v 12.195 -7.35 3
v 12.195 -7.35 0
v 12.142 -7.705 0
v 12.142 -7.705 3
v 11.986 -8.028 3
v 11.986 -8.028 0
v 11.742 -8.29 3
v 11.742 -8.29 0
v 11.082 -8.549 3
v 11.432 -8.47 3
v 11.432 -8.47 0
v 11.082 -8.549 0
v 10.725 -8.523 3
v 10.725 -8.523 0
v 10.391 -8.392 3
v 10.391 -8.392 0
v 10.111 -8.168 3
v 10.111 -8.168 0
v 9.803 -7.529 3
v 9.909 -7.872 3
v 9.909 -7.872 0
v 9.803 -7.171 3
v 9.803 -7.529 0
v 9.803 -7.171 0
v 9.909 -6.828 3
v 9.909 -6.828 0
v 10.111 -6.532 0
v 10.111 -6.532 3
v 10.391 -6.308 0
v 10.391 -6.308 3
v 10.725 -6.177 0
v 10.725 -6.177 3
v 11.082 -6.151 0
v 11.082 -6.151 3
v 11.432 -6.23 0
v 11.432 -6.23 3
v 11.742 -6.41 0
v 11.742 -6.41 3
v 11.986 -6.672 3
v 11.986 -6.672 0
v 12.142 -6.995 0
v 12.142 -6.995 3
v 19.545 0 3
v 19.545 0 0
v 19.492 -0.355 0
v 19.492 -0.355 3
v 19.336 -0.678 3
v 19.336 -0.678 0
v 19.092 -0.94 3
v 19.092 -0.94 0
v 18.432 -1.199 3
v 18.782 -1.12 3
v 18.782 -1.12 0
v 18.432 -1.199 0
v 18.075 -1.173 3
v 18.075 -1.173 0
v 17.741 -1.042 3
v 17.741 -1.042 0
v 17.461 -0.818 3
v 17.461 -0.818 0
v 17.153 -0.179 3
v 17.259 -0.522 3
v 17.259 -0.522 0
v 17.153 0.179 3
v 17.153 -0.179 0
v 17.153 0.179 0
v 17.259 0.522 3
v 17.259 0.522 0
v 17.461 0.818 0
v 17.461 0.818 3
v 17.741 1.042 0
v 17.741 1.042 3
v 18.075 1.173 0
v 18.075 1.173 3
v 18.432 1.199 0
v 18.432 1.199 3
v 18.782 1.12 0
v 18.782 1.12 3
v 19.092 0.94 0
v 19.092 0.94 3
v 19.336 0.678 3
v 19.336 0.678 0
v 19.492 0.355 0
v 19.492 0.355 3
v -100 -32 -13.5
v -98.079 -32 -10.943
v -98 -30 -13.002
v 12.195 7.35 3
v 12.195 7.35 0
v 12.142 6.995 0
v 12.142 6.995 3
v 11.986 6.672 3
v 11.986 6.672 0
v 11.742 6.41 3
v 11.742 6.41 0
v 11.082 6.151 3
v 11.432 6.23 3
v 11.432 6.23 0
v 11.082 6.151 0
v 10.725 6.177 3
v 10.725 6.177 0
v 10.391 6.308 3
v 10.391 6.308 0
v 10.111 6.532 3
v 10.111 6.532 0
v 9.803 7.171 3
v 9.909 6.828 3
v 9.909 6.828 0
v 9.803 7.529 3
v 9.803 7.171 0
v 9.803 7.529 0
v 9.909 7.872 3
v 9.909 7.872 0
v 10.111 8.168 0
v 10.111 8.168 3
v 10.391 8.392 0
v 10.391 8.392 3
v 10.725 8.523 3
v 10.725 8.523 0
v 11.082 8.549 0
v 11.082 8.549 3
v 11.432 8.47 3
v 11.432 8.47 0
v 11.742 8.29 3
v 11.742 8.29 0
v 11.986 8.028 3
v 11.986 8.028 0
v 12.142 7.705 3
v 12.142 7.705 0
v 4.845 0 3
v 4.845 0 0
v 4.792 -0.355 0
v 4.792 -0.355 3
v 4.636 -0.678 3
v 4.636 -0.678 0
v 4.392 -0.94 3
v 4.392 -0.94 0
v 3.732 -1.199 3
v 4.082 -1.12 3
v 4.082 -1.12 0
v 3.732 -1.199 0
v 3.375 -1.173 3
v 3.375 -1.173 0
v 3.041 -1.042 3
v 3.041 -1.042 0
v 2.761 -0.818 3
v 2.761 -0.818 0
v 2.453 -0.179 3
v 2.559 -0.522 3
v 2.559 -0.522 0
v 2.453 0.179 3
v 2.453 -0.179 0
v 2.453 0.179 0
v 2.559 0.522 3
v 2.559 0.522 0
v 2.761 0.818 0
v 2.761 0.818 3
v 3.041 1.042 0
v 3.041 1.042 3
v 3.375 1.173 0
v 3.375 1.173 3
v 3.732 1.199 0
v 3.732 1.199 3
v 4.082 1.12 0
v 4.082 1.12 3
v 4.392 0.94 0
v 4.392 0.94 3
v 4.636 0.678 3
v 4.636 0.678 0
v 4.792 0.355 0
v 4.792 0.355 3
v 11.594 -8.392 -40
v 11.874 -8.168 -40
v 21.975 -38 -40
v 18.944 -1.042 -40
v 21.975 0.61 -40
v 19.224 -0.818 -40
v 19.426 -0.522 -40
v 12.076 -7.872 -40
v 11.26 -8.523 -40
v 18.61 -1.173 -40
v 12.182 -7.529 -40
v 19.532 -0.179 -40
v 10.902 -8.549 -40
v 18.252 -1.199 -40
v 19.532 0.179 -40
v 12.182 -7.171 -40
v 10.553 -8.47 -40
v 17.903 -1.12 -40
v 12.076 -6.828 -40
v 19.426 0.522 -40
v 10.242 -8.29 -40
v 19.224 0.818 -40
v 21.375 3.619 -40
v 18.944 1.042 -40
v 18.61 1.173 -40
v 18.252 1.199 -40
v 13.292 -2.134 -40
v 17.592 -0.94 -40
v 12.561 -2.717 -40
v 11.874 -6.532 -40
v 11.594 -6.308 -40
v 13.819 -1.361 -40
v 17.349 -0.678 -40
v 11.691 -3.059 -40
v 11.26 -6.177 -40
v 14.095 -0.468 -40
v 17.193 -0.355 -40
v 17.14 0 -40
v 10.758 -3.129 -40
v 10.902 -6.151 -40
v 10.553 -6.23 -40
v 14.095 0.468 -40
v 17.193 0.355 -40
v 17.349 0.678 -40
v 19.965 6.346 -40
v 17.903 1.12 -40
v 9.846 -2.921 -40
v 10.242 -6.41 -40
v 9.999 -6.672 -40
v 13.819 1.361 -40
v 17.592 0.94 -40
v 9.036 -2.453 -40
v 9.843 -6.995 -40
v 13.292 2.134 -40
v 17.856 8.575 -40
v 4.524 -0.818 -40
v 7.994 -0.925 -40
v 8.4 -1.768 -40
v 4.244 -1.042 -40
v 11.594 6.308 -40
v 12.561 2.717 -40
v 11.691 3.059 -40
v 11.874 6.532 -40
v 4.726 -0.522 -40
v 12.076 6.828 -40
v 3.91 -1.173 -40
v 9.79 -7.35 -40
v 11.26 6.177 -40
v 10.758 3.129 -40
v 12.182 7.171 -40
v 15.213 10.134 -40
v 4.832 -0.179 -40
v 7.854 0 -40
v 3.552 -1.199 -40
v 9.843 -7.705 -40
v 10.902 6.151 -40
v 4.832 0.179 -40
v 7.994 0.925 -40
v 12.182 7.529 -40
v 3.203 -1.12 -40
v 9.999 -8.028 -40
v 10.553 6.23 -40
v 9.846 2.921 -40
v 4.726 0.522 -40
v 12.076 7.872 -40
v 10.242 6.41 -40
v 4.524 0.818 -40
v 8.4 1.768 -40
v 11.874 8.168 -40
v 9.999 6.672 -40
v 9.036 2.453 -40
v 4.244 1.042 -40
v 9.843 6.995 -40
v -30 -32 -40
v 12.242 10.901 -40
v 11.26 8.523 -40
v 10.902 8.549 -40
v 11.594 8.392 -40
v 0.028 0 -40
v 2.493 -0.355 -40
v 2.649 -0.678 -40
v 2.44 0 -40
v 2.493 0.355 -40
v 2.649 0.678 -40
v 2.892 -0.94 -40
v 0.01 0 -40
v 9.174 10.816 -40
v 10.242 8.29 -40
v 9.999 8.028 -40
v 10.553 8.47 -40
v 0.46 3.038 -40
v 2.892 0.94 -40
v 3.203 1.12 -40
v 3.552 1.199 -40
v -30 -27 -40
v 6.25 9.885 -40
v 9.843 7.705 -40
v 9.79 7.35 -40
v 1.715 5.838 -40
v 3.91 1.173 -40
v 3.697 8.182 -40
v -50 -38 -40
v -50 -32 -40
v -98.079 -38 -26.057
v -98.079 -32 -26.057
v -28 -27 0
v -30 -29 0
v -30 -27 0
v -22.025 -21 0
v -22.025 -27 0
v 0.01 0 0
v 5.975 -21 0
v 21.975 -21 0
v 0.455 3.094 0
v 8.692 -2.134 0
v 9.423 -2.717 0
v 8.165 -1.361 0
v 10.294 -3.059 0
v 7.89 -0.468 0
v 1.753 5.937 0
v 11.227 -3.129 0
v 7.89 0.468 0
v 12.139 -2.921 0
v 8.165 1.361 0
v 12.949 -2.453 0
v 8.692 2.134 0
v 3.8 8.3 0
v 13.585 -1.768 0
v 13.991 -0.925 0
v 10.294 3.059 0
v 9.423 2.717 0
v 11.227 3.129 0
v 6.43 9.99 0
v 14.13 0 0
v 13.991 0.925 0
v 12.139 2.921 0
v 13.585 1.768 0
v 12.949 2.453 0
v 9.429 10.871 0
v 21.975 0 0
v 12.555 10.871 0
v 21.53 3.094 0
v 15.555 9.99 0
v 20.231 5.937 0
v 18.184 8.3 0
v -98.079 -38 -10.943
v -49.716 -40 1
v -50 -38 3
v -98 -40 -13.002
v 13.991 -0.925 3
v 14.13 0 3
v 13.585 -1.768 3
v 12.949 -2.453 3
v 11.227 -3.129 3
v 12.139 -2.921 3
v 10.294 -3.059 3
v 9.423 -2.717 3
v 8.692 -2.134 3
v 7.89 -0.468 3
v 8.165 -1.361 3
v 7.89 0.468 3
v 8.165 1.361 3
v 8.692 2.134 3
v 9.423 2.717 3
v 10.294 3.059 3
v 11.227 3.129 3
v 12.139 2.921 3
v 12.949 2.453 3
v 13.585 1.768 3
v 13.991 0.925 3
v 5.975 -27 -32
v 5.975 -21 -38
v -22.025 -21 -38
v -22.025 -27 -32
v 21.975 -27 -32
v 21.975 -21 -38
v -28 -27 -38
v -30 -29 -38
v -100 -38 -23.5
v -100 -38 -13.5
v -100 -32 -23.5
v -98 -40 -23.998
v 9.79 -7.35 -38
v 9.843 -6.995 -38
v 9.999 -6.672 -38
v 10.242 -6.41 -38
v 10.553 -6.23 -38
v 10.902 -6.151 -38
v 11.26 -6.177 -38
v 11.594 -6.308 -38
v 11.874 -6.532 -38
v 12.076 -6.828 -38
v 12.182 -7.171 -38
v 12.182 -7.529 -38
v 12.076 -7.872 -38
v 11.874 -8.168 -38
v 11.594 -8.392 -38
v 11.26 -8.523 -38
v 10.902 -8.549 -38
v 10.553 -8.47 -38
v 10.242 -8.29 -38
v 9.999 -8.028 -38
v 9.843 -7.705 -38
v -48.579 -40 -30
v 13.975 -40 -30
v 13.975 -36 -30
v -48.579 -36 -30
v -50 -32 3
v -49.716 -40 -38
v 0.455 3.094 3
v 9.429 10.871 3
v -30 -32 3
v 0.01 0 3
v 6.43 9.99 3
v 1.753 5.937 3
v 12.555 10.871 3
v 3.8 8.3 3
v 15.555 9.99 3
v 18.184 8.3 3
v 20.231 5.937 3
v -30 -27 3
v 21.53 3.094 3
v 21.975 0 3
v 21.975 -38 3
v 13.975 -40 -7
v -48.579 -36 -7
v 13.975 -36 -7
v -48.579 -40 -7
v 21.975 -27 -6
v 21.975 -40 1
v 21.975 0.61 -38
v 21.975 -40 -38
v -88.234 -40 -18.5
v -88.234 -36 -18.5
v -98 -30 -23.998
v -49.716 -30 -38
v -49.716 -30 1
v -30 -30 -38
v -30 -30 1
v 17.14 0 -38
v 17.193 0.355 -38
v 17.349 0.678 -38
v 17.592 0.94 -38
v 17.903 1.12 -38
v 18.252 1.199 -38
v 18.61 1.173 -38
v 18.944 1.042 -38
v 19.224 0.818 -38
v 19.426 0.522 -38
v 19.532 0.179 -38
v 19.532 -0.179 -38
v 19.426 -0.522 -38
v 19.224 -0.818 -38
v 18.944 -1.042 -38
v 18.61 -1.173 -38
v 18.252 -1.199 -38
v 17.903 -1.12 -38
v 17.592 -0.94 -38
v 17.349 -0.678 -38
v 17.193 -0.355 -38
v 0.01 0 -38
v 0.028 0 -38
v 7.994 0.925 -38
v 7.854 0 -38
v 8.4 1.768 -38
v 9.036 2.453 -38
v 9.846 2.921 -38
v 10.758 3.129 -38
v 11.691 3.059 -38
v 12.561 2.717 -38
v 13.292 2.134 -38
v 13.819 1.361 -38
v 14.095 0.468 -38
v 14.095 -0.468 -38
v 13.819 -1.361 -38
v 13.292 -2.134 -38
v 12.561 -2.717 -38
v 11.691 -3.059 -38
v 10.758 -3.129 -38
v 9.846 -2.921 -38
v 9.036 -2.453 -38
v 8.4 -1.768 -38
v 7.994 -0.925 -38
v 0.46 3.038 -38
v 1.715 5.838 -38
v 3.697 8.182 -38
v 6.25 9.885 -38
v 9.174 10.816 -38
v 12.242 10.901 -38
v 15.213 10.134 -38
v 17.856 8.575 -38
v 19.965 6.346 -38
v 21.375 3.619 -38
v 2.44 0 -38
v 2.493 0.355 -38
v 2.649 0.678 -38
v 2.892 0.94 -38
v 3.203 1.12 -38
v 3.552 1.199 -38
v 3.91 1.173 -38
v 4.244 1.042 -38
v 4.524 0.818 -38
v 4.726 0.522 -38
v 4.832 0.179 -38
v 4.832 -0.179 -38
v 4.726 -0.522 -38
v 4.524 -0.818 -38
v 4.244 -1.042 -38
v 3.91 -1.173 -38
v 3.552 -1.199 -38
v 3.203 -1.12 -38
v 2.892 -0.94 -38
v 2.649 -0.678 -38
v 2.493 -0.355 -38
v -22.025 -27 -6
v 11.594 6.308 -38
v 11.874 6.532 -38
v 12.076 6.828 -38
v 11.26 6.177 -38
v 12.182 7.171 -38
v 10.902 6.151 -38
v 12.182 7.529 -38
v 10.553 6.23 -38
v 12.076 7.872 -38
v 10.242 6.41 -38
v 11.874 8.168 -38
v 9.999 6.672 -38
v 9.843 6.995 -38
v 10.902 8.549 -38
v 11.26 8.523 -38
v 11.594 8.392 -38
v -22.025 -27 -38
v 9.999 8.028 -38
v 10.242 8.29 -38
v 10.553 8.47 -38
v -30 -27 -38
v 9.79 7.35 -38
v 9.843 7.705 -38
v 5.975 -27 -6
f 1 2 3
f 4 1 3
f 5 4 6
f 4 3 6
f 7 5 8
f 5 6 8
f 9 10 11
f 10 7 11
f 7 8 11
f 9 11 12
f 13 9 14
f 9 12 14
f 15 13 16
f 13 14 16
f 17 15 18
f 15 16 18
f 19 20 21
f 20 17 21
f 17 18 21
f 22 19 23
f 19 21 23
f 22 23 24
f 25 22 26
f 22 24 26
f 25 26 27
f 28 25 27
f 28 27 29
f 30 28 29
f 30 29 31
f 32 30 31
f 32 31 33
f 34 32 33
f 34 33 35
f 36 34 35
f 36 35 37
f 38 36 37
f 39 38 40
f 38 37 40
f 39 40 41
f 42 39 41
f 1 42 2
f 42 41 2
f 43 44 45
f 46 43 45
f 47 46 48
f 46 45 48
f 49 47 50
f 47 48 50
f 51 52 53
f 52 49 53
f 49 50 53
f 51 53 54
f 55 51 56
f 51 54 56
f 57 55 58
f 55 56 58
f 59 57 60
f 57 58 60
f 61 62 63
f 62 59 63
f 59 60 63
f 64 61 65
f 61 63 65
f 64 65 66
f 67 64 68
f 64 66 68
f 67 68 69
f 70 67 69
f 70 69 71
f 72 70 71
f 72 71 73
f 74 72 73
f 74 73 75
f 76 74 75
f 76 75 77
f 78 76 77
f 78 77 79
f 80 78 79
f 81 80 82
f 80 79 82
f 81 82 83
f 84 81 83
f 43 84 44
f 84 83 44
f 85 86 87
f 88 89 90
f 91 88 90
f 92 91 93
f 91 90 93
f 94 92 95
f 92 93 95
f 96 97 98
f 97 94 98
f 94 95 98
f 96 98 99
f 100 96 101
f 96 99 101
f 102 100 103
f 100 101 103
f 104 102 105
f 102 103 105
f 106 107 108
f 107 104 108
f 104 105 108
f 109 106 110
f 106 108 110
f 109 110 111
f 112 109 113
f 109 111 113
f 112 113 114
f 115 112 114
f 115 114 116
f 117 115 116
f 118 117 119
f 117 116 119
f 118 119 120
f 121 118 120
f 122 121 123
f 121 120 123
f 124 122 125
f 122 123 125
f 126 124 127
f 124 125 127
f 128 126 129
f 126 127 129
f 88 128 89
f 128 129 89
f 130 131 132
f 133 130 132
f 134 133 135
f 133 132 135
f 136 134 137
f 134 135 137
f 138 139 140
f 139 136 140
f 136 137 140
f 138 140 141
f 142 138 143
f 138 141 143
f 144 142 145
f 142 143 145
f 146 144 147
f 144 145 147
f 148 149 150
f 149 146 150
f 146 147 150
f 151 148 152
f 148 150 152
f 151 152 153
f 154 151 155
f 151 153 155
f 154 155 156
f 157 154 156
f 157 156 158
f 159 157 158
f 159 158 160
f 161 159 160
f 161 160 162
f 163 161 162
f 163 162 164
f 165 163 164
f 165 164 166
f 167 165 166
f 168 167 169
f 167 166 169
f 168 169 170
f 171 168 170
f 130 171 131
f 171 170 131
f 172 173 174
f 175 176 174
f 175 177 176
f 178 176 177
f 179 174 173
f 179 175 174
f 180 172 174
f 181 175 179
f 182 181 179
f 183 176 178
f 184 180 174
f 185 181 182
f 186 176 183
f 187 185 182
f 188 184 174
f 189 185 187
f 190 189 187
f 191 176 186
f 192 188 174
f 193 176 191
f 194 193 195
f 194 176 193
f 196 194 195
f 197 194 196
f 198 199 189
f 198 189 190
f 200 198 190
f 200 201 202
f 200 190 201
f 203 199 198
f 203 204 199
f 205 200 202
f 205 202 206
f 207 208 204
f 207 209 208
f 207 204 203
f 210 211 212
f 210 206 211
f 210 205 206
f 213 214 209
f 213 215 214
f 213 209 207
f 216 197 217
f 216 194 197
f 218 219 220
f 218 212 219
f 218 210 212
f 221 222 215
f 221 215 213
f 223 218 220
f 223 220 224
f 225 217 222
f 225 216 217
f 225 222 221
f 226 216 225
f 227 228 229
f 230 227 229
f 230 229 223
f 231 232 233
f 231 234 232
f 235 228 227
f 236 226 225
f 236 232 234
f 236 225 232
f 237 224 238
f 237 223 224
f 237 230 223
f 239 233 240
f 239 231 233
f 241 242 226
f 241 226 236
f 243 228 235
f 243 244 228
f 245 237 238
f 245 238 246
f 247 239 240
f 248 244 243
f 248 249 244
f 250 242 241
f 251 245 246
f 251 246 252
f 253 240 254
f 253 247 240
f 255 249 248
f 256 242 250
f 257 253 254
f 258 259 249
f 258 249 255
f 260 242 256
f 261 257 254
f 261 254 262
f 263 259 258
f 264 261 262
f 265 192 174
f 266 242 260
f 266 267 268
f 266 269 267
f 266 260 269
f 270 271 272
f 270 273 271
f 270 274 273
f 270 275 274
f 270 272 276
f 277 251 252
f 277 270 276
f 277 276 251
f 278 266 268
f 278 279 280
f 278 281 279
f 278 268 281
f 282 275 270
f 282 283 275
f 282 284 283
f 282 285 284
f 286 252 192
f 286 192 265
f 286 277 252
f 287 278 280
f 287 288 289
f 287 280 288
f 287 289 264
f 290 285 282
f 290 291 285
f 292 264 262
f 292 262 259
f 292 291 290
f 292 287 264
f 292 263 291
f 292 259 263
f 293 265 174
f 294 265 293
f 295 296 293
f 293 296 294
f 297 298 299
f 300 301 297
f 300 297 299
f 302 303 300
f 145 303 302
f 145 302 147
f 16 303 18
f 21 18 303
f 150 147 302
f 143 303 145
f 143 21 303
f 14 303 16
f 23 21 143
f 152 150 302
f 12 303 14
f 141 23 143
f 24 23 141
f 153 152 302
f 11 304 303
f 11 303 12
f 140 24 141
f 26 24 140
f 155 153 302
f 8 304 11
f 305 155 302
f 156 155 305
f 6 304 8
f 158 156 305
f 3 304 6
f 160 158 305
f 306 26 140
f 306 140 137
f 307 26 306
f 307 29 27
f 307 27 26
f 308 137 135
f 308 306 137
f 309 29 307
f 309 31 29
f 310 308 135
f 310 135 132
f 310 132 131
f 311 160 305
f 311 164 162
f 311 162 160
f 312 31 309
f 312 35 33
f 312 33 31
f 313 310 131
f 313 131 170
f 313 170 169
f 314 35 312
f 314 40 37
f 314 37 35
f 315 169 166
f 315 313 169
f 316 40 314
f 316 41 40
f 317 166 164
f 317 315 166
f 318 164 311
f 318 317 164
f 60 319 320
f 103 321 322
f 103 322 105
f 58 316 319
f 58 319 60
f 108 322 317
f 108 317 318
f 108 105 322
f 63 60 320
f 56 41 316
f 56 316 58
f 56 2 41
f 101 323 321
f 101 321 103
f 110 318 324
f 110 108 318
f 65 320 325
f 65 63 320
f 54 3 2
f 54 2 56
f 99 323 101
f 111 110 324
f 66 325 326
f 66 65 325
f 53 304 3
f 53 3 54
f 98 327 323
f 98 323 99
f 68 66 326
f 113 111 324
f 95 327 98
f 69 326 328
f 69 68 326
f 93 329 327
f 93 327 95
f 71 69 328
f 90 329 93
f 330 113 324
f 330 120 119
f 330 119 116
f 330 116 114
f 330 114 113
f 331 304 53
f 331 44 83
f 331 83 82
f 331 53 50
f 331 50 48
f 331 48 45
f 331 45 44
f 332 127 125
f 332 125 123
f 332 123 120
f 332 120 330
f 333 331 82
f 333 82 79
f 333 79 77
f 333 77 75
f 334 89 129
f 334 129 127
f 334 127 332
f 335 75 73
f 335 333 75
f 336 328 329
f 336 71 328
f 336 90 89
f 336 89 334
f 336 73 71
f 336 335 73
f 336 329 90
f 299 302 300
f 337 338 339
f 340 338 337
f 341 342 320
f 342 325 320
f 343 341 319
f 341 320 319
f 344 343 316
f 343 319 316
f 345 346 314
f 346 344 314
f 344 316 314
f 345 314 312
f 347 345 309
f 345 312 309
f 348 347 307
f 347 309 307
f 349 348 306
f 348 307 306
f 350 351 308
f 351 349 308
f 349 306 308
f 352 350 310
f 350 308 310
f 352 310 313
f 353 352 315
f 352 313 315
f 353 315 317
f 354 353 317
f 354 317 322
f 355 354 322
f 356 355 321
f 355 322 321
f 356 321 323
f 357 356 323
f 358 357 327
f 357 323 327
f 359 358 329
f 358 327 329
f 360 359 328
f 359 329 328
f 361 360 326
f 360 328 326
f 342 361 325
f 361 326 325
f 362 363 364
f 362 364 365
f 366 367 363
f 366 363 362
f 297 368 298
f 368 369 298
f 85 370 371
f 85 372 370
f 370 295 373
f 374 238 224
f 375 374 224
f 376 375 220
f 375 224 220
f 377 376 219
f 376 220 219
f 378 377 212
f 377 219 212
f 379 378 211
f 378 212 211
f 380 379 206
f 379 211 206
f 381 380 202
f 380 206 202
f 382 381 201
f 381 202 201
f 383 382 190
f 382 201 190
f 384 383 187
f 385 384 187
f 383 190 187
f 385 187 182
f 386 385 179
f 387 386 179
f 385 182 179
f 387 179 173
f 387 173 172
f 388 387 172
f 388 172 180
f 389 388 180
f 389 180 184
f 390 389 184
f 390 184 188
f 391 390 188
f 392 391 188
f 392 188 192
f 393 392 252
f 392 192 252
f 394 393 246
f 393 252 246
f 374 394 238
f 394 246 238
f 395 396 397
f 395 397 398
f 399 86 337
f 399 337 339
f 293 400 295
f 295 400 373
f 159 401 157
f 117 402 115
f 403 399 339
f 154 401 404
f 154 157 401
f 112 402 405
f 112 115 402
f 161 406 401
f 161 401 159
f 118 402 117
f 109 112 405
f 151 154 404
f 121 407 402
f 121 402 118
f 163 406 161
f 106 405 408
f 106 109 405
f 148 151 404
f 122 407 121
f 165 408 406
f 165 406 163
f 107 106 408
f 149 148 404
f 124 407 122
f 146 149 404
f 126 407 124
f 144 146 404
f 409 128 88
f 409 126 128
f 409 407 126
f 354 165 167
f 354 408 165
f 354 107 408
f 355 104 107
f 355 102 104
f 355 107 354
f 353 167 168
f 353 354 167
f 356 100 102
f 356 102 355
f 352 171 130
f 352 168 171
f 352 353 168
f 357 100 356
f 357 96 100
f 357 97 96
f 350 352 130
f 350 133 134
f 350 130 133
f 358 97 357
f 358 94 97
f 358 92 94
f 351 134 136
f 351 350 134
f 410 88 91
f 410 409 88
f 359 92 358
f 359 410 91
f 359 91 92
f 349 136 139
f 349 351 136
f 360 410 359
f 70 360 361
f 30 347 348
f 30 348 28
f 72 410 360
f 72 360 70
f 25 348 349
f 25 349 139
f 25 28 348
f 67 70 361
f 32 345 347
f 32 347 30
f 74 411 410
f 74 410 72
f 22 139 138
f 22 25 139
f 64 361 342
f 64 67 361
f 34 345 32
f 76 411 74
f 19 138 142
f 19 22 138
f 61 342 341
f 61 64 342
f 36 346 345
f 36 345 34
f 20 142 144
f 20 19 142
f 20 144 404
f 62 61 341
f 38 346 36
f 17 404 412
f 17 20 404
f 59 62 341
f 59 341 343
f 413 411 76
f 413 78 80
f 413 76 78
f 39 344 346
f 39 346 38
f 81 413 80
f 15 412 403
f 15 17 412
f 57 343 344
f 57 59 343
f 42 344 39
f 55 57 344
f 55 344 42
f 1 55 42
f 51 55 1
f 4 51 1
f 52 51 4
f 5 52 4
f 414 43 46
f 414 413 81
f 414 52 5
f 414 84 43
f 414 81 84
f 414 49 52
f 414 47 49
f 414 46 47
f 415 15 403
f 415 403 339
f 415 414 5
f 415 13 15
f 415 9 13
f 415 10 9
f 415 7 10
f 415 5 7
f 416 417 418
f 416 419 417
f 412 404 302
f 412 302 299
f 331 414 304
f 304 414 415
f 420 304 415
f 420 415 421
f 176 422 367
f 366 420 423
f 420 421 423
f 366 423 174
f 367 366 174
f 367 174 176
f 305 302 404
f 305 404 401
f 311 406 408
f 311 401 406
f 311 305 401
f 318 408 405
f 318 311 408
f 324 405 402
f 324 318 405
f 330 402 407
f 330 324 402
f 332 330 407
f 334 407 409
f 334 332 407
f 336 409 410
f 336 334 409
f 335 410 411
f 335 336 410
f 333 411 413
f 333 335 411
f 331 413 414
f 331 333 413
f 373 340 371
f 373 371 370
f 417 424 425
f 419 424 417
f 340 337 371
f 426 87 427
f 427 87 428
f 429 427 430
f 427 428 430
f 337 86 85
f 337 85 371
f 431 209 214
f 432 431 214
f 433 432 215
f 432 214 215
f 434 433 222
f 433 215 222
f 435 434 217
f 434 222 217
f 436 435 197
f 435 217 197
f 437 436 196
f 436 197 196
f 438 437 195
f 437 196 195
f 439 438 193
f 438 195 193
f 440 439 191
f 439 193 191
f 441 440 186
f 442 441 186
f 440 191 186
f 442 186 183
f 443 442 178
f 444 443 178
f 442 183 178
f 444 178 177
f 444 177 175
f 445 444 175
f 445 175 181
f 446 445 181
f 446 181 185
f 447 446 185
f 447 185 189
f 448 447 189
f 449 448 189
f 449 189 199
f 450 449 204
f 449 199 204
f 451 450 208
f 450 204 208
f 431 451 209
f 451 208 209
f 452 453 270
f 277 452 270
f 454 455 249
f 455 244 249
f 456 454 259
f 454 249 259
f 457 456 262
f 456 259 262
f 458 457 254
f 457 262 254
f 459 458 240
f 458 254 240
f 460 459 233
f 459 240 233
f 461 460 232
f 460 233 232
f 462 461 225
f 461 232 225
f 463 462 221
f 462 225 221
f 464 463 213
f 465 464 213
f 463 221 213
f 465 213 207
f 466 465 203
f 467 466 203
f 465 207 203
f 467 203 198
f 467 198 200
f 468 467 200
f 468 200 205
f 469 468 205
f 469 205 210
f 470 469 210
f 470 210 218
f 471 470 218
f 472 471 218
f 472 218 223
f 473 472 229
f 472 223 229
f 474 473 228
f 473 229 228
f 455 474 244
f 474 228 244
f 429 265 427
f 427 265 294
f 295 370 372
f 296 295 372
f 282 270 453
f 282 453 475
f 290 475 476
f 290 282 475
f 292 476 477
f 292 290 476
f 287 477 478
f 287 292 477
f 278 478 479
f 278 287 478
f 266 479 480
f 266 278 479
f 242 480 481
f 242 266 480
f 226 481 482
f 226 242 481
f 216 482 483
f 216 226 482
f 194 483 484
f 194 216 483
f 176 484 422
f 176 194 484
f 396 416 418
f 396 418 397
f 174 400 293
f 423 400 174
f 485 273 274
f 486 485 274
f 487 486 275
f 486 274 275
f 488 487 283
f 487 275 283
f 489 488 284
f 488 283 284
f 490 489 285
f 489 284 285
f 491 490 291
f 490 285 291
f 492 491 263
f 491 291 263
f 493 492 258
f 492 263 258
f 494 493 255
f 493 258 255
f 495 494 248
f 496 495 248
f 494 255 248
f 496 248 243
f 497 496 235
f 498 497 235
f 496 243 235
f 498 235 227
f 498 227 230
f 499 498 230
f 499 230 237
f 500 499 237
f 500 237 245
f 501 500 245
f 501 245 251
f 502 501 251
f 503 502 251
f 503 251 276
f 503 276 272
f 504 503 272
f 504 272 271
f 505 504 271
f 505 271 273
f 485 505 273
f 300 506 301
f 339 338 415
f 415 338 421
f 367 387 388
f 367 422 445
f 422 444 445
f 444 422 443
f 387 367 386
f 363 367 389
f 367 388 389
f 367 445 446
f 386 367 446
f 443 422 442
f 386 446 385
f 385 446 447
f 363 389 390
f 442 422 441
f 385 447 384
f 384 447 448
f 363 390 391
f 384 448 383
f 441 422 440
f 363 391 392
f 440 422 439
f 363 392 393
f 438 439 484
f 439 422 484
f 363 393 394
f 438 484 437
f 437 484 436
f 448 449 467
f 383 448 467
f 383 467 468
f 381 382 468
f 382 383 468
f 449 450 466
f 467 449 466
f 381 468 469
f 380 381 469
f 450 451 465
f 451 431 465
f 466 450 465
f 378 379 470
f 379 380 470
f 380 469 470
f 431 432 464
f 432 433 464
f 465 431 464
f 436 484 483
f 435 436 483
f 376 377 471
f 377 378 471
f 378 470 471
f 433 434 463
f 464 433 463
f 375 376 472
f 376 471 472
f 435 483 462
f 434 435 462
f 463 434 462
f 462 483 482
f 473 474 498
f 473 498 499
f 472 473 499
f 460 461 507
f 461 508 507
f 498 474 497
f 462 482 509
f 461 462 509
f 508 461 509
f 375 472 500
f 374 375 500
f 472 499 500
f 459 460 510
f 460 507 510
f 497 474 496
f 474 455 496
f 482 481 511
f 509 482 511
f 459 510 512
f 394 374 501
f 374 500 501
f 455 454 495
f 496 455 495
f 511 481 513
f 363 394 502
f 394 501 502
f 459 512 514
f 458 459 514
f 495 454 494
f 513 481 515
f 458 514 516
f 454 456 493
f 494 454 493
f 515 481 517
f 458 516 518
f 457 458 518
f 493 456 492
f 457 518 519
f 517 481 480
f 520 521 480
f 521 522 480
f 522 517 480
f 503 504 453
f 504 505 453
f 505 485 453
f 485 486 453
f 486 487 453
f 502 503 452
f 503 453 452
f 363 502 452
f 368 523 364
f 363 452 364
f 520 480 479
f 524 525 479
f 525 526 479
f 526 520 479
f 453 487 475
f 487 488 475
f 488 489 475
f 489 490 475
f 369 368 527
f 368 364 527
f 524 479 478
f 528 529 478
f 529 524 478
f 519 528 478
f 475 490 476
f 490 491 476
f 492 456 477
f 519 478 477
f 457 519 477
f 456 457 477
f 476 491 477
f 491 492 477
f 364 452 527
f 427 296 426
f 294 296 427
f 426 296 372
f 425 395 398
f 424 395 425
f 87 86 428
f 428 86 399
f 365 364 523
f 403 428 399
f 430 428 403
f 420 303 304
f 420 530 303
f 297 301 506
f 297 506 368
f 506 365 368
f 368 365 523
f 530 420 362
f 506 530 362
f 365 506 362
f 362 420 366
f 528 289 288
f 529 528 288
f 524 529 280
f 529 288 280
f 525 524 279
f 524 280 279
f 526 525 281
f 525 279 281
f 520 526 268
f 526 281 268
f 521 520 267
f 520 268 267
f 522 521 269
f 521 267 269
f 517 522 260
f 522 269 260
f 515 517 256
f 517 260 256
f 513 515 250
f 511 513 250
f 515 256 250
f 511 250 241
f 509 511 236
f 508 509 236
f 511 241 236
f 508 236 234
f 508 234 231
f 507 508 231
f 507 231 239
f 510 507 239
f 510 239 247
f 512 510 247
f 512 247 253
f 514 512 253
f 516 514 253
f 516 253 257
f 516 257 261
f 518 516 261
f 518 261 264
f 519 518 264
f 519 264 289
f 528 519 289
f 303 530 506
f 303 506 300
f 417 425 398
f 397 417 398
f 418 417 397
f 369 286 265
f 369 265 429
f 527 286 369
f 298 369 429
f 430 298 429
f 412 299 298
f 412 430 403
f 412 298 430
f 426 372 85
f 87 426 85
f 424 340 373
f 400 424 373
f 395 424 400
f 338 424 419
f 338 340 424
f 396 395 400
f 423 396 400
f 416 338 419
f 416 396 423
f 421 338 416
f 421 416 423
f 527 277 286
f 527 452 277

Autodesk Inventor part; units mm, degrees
ref_plane "YZ Plane" through (0, 0, 0) normal (1, 0, 0) x (0, 1, 0)
ref_plane "XZ Plane" through (0, 0, 0) normal (0, 1, 0) x (-1, 0, 0)
ref_plane "XY Plane" through (0, 0, 0) normal (0, 0, 1) x (1, 0, 0)
ref_plane "Plano de trabajo1" through (0, 0, 0) normal (0, 0, 1) x (1, 0, 0)
sketch "Boceto1" plane through (0, 0, 0) normal (0, 0, 1) x (1, 0, 0)
  circle A0 centre (10.9923, 0) radius 10.9823 projected
  circle A1 centre (10.9923, 0) radius 3.1378 projected
  circle A2 centre (18.3423, 0) radius 1.2028 projected
  circle A3 centre (10.9923, 7.35) radius 1.2028 projected
  circle A4 centre (3.6423, 0) radius 1.2028 projected
  circle A5 centre (10.9923, -7.35) radius 1.2028 projected
  line L0 (0, 0) -> (0, 30)
  line L1 (21.9746, 0) -> (21.9746, -30)
  line L2 (0, 0) -> (0, -30)
  line L3 (0, -30) -> (21.9746, -30)
  circle A6 centre (10.9923, 0) radius 3.1378
  circle A7 centre (18.3423, 0) radius 1.2028
  circle A8 centre (10.9923, -7.35) radius 1.2028
  circle A9 centre (3.6423, 0) radius 1.2028
  circle A10 centre (10.9923, 7.35) radius 1.2028
  circle A11 centre (10.9923, 0) radius 10.9823
  line L4 (0, 0) -> (0, -30)
  line L5 (0, -30) -> (21.9746, -30)
  line L6 (21.9746, -30) -> (21.9746, 0)
  dimension "d0" = 30
  dimension "d1" = 30
extrude "Extrusión1" add sketch "Boceto1" along normal blind 3
sketch "Boceto2" plane through (10.9923, 0, 3) normal (0, 0, 1) x (1, 0, 0)
  circle A0 centre (0, 0) radius 10.9823 projected
  line L0 (10.9823, 0) -> (10.9823, -30)
  line L1 (10.9823, -30) -> (-9.7118, -30)
  line L2 (-9.7118, -30) -> (-10.9923, 0)
  circle A1 centre (0, 0) radius 10.9823 projected
  circle A2 centre (0, -7.35) radius 1.2028 projected
  circle A3 centre (-7.35, 0) radius 1.2028 projected
  circle A4 centre (0, 7.35) radius 1.2028 projected
  circle A5 centre (7.35, 0) radius 1.2028 projected
  circle A6 centre (0, 0) radius 3.1378 projected
  point P0 (-10.9723, -0.4683)
  dimension "d4" = 30
extrude "Extrusión2" add sketch "Boceto2" against normal blind 3 contours L0 L1 L2 A0
sketch "Boceto3" plane through (0, 0, 0) normal (0, 0, -1) x (-1, 0, 0)
  point P0 (0, 0)
sketch "Boceto4" plane through (0, 0, 3) normal (0, 0, 1) x (1, 0, 0)
  point P0 (0, 0)
sketch "Boceto5" plane through (0, 0, 0) normal (0, 0, -1) x (-1, 0, 0)
  arc A0 (-0.02, -0.4683) -> (-21.9746, 0) centre (-10.9923, 0) ccw projected
  line L0 (-21.9746, 0) -> (-21.9746, -30) projected
  line L1 (-21.9746, -30) -> (-1.2805, -30) projected
  line L2 (-1.2805, -30) -> (-0.02, -0.4683) projected
  circle A1 centre (-10.9923, -7.35) radius 1.2028 projected
  circle A2 centre (-3.6423, 0) radius 1.2028 projected
  circle A3 centre (-10.9923, 7.35) radius 1.2028 projected
  circle A4 centre (-18.3423, 0) radius 1.2028 projected
  circle A5 centre (-10.9923, 0) radius 3.1378 projected
  line L3 (-21.9746, -30) -> (0, -30)
  line L4 (0, -30) -> (0, 0)
  line L5 (0, 0) -> (-21.9746, 0)
  line L6 (-21.9746, 0) -> (-21.9746, -30)
  point P0 (-0.01, 0)
extrude "Extrusión3" add sketch "Boceto5" against normal blind 3 contours A0 L5 L4 L3 L2
sketch "Boceto6" plane through (0, 0, 0) normal (0, 0, -1) x (-1, 0, 0)
  point P0 (0, 0)
sketch "Boceto7" plane through (0, 0, 0) normal (0, 0, -1) x (-1, 0, 0)
  line L0 (-21.9746, -30) -> (0, -30) projected
  line L1 (-21.9746, -30) -> (-21.9746, 0) projected
  line L2 (0, -30) -> (-21.9746, -30)
  line L3 (-21.9746, -30) -> (-21.9746, -27)
  line L4 (-21.9746, -27) -> (0, -27)
  line L5 (0, -27) -> (0, -30)
  point P0 (0, 0)
  dimension "d9" = 3
extrude "Extrusión4" add sketch "Boceto7" along normal blind 40
sketch "Boceto8" plane through (0, -27, 0) normal (0, 1, 0) x (1, 0, 0)
  line L0 (0, -3) -> (0, 40) projected
  line L1 (21.9746, -3) -> (21.9746, 40) projected
  line L2 (0, 40) -> (21.9746, 40)
  line L3 (21.9746, 40) -> (21.9746, 38)
  line L4 (21.9746, 38) -> (0, 38)
  line L5 (0, 38) -> (0, 40)
  point P0 (0, 0)
  point P1 (21.9746, 40)
  point P2 (0, 38)
  dimension "d12" = 2
extrude "Extrusión5" add sketch "Boceto8" along normal blind 40
sketch "Boceto9" plane through (0, 0, -40) normal (0, 0, -1) x (-1, 0, 0)
  circle A0 centre (-11.0072, -0.015) radius 2.7 projected
  circle A1 centre (-11.0099, -0.0117) radius 10.9823 projected
  circle A2 centre (-18.3423, 0) radius 1.2028 projected
  circle A3 centre (-10.9923, -7.35) radius 1.2028 projected
  circle A4 centre (-10.9923, 7.35) radius 1.2028 projected
  circle A5 centre (-3.6423, 0) radius 1.2028 projected
  line L0 (-21.9746, -30) -> (-21.9746, 13) projected
  line L1 (-21.9746, -30) -> (0, -30) projected
  line L2 (0, -30) -> (0, 13) projected
  line L3 (-21.9746, 13) -> (0, 13) projected
  line L4 (-21.5706, 0) -> (-25.972, 0)
  line L5 (-25.972, 0) -> (-25.972, 18.1609)
  line L6 (-25.972, 18.1609) -> (4.5124, 18.1609)
  line L7 (4.5124, 18.1609) -> (4.5124, 1.2028)
  line L8 (4.5124, 1.2028) -> (4.5124, 0)
  line L9 (-3.6423, 0) -> (4.822, 0)
  point P0 (0, 0)
  point P1 (-21.9746, 0.6093)
  point P2 (-0.0276, 0)
  point P3 (0, 0)
extrude "Extrusión6" cut sketch "Boceto9" against normal blind 40 contours A0 | A1 L0 L3 L2 L9 | A2 | A3 | A4 | A5
sketch "Boceto10" plane through (0, -30, 3) normal (0, -1, 0) x (1, 0, 0)
  point P0 (0, -3)
sketch "Boceto11" plane through (0, -30, 3) normal (0, -1, 0) x (1, 0, 0)
  line L0 (0.0276, -43) -> (21.9746, -43) projected
  line L1 (0, -3) -> (0, 0) projected
  line L2 (21.9746, -43) -> (0, -43)
  line L3 (0, -43) -> (0, 0)
  line L4 (0, 0) -> (21.9746, 0)
  line L5 (21.9746, 0) -> (21.9746, -43)
  line L6 (0, -43) -> (-100, -43)
  line L7 (-100, -43) -> (-100, 0)
  line L8 (-100, 0) -> (0, 0)
  line L9 (0, 0) -> (0, -43)
  line L10 (-100, 0) -> (-100, -21.5)
  line L11 (-100, -21.5) -> (-100, -14.5)
  line L12 (-100, -14.5) -> (-100, -28.5)
  line L13 (-100, -28.5) -> (-50, -43)
  line L14 (-50, -43) -> (-50, 0)
  line L15 (-100, -14.5) -> (-50, 0)
  dimension "d17" = 100
  dimension "d18" = 21.5
  dimension "d19" = 7
  dimension "d20" = 14
extrude "Extrusión7" add sketch "Boceto11" along normal blind 10 contours L2 L3 L1 L4 L5 L0 | L6 L14 L8 L1 L3 | L13 L7 L15 L14
chamfer "Chaflán1" distance 2 angle 45 12 edges at (-14.0127, -40, -40) (-75, -40, -32.75) (-75, -30, -32.75) (-25, -30, -40) (-14.0127, -40, 3) (-75, -40, -4.25) (-100, -40, -18.5) (-75, -30, -4.25) (-25, -30, 3) (-100, -30, -18.5) (-100, -35, -25.5) (-100, -35, -11.5)
sketch "Boceto12" plane through (0, -40, 3) normal (0, -1, 0) x (1, 0, 0)
  line L0 (-49.7159, -2) -> (21.9746, -2) projected
  line L1 (-98, -16.0024) -> (-49.7159, -2) projected
  line L2 (-98, -26.9976) -> (-98, -16.0024) projected
  line L3 (-49.7159, -41) -> (-98, -26.9976) projected
  line L4 (21.9746, -41) -> (-49.7159, -41) projected
  line L5 (21.9746, -41) -> (21.9746, -2) projected
  line L6 (-48.5793, -33) -> (-88.2344, -21.5)
  line L7 (-88.2344, -21.5) -> (-48.5793, -10)
  line L8 (-48.5793, -10) -> (13.9746, -10)
  line L9 (13.9746, -10) -> (13.9746, -33)
  line L10 (13.9746, -33) -> (-48.5793, -33)
  point P0 (0, -3)
  dimension "d26" = 8
extrude "Extrusión8" cut sketch "Boceto12" against normal blind 4 contours L6 L7 L8 L9 L10
sketch "Boceto13" plane through (0, 0, -40) normal (0, 0, -1) x (-1, 0, 0)
  circle A0 centre (-11.0099, -0.0117) radius 5.6 projected
  circle A1 centre (-11.0072, -0.015) radius 2.7 projected
  point P0 (0, 0)
extrude "Extrusión9" cut sketch "Boceto13" against normal blind 5
sketch "Boceto14" plane through (0, 0, 0) normal (-1, 0, 0) x (0, 0, 1)
  line L0 (0, -27) -> (-38, -27) projected
  line L1 (-38, 0) -> (-40, 0) projected
  line L2 (-40, -32) -> (-40, 0) projected
  line L3 (-38, -30) -> (-40, -32) projected
  line L4 (1, -30) -> (-38, -30) projected
  line L5 (3, -32) -> (1, -30) projected
  line L6 (3, 0) -> (3, -32) projected
  line L7 (0, 0) -> (3, 0) projected
  line L8 (0, -27) -> (0, 0) projected
  line L9 (0, -27) -> (-38, -27) projected
  line L10 (-38, -27) -> (-38, 0) projected
  point P0 (0, 0)
extrude "Extrusión10" add sketch "Boceto14" along normal blind 30
sketch "Boceto15" plane through (0, 0, 3) normal (0, 0, 1) x (1, 0, 0)
  line L0 (21.9746, -38) -> (-50, -38) projected
  line L1 (21.9746, -38) -> (21.9746, 0) projected
  arc A0 (21.9746, 0) -> (0.01, 0) centre (10.9923, 0) ccw projected
  line L2 (0.01, 0) -> (-30, 0) projected
  line L3 (-30, -32) -> (-30, 0) projected
  line L4 (-50, -32) -> (-30, -32) projected
  line L5 (-50, -32) -> (-50, -38) projected
  circle A1 centre (10.9923, -7.35) radius 1.2028 projected
  circle A2 centre (3.6423, 0) radius 1.2028 projected
  circle A3 centre (10.9923, 7.35) radius 1.2028 projected
  circle A4 centre (18.3423, 0) radius 1.2028 projected
  circle A5 centre (10.9923, 0) radius 3.1378 projected
  line L6 (21.9746, -27) -> (-30, -27) projected
  line L7 (0.01, 0) -> (-30, -27)
  point P0 (0, 0)
extrude "Extrusión11" cut sketch "Boceto15" against normal blind 100 contours L3 L2 L7
chamfer "Chaflán2" distance 2 angle 45 1 edges at (-30, -27, -19)
sketch "Boceto16" plane through (21.9746, -27, 0) normal (0, 1, 0) x (1, 0, 0)
  line L0 (-49.9746, 0) -> (-49.9746, 38) projected
  line L1 (0, 0) -> (-49.9746, 0) projected
  line L2 (0, 0) -> (0, 38) projected
  line L3 (0, 38) -> (-49.9746, 38) projected
  line L4 (0, 0) -> (-16, 0)
  line L5 (-16, 0) -> (-16, 6)
  line L6 (-16, 6) -> (0, 6)
  line L7 (0, 6) -> (0, 0)
  line L8 (0, 38) -> (-16, 38)
  line L9 (-16, 38) -> (-16, 32)
  line L10 (-16, 32) -> (0, 32)
  line L11 (0, 32) -> (0, 38)
  point P0 (-21.9746, 0)
  dimension "d38" = 16
  dimension "d39" = 6
  dimension "d40" = 16
  dimension "d41" = 6
extrude "Extrusión12" add sketch "Boceto16" along normal blind 6 contours L5 L6 L2 L1 | L3 L2 L10 L9
chamfer "Chaflán3" distance 6 angle 45 2 edges at (13.9746, -21, -6) (13.9746, -21, -32)
sketch "Boceto17" plane through (5.9746, -27, -38) normal (-1, 0, 0) x (0, 0, 1)
  line L0 (0, 6) -> (6, 0) projected
  line L1 (0, 0) -> (0, 6) projected
  line L2 (6, 0) -> (0, 0) projected
  line L3 (32, 0) -> (38, 6) projected
  line L4 (38, 0) -> (32, 0) projected
  line L5 (38, 6) -> (38, 0) projected
  point P0 (38, 27)
extrude "Extrusión13" add sketch "Boceto17" along normal blind 28
sketch "Boceto18" plane through (0, 0, -40) normal (0, 0, -1) x (-1, 0, 0)
  circle A0 centre (-10.9923, 0) radius 3.1378 projected
  circle A1 centre (-11.0099, -0.0117) radius 5.6 projected
  point P0 (0, 0)
extrude "Extrusión14" add sketch "Boceto18" against normal blind 2
properties part number "tibia"
